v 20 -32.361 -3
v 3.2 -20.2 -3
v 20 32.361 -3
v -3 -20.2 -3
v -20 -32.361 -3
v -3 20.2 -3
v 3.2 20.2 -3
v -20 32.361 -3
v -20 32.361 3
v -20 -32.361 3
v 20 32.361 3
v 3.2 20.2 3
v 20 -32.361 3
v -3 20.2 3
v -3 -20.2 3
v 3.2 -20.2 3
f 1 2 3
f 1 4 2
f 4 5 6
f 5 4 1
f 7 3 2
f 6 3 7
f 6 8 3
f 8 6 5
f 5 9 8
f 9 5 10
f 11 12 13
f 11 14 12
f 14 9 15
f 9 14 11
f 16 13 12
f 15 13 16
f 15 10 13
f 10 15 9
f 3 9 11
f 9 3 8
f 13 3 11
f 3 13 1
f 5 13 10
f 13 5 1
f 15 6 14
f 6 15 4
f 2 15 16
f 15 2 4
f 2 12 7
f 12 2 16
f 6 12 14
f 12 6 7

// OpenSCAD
// Polygonal Tiles v.01
// (C) @oblomobka - 2023.03
// GPL license

phi = (1+sqrt(5))/2; // Golden ratio = 1,618...

module RectangularTile (side = 1, relation = phi, h = 0.35, Bevel =1){
    
    
    
    a = side * 0.5 ;
    b = a * relation;  
    
    // Definition of points and faces
    Gpoints=[
        [ +a, +b, 0], [ +a, -b, 0], [ -a, +b, 0], [ -a, -b, 0],
        [ +a, +b, h], [ +a, -b, h], [ -a, +b, h], [ -a, -b, h]
        ];
       
    Gfaces=[
        [ 0, 2, 3, 1], [ 4, 5, 7, 6],   // Floor & Roof
        // Walls
        [ 0, 4, 6, 2], [ 2,6,7,3],
        [ 3, 7, 5, 1], [ 1, 5, 4, 0]
    ];
    
    polyhedron(Gpoints,Gfaces);
}
side = 40;
h=6;
gap = 0.2;

difference(){
    translate([0,0,-h/2]) { RectangularTile(side = side, relation = phi, h = h);}
    rotate([90,0,90])
        translate([0,0,-h/2])
            RectangularTile(side = side + 2*gap, relation = phi, h = h + gap);
    }
